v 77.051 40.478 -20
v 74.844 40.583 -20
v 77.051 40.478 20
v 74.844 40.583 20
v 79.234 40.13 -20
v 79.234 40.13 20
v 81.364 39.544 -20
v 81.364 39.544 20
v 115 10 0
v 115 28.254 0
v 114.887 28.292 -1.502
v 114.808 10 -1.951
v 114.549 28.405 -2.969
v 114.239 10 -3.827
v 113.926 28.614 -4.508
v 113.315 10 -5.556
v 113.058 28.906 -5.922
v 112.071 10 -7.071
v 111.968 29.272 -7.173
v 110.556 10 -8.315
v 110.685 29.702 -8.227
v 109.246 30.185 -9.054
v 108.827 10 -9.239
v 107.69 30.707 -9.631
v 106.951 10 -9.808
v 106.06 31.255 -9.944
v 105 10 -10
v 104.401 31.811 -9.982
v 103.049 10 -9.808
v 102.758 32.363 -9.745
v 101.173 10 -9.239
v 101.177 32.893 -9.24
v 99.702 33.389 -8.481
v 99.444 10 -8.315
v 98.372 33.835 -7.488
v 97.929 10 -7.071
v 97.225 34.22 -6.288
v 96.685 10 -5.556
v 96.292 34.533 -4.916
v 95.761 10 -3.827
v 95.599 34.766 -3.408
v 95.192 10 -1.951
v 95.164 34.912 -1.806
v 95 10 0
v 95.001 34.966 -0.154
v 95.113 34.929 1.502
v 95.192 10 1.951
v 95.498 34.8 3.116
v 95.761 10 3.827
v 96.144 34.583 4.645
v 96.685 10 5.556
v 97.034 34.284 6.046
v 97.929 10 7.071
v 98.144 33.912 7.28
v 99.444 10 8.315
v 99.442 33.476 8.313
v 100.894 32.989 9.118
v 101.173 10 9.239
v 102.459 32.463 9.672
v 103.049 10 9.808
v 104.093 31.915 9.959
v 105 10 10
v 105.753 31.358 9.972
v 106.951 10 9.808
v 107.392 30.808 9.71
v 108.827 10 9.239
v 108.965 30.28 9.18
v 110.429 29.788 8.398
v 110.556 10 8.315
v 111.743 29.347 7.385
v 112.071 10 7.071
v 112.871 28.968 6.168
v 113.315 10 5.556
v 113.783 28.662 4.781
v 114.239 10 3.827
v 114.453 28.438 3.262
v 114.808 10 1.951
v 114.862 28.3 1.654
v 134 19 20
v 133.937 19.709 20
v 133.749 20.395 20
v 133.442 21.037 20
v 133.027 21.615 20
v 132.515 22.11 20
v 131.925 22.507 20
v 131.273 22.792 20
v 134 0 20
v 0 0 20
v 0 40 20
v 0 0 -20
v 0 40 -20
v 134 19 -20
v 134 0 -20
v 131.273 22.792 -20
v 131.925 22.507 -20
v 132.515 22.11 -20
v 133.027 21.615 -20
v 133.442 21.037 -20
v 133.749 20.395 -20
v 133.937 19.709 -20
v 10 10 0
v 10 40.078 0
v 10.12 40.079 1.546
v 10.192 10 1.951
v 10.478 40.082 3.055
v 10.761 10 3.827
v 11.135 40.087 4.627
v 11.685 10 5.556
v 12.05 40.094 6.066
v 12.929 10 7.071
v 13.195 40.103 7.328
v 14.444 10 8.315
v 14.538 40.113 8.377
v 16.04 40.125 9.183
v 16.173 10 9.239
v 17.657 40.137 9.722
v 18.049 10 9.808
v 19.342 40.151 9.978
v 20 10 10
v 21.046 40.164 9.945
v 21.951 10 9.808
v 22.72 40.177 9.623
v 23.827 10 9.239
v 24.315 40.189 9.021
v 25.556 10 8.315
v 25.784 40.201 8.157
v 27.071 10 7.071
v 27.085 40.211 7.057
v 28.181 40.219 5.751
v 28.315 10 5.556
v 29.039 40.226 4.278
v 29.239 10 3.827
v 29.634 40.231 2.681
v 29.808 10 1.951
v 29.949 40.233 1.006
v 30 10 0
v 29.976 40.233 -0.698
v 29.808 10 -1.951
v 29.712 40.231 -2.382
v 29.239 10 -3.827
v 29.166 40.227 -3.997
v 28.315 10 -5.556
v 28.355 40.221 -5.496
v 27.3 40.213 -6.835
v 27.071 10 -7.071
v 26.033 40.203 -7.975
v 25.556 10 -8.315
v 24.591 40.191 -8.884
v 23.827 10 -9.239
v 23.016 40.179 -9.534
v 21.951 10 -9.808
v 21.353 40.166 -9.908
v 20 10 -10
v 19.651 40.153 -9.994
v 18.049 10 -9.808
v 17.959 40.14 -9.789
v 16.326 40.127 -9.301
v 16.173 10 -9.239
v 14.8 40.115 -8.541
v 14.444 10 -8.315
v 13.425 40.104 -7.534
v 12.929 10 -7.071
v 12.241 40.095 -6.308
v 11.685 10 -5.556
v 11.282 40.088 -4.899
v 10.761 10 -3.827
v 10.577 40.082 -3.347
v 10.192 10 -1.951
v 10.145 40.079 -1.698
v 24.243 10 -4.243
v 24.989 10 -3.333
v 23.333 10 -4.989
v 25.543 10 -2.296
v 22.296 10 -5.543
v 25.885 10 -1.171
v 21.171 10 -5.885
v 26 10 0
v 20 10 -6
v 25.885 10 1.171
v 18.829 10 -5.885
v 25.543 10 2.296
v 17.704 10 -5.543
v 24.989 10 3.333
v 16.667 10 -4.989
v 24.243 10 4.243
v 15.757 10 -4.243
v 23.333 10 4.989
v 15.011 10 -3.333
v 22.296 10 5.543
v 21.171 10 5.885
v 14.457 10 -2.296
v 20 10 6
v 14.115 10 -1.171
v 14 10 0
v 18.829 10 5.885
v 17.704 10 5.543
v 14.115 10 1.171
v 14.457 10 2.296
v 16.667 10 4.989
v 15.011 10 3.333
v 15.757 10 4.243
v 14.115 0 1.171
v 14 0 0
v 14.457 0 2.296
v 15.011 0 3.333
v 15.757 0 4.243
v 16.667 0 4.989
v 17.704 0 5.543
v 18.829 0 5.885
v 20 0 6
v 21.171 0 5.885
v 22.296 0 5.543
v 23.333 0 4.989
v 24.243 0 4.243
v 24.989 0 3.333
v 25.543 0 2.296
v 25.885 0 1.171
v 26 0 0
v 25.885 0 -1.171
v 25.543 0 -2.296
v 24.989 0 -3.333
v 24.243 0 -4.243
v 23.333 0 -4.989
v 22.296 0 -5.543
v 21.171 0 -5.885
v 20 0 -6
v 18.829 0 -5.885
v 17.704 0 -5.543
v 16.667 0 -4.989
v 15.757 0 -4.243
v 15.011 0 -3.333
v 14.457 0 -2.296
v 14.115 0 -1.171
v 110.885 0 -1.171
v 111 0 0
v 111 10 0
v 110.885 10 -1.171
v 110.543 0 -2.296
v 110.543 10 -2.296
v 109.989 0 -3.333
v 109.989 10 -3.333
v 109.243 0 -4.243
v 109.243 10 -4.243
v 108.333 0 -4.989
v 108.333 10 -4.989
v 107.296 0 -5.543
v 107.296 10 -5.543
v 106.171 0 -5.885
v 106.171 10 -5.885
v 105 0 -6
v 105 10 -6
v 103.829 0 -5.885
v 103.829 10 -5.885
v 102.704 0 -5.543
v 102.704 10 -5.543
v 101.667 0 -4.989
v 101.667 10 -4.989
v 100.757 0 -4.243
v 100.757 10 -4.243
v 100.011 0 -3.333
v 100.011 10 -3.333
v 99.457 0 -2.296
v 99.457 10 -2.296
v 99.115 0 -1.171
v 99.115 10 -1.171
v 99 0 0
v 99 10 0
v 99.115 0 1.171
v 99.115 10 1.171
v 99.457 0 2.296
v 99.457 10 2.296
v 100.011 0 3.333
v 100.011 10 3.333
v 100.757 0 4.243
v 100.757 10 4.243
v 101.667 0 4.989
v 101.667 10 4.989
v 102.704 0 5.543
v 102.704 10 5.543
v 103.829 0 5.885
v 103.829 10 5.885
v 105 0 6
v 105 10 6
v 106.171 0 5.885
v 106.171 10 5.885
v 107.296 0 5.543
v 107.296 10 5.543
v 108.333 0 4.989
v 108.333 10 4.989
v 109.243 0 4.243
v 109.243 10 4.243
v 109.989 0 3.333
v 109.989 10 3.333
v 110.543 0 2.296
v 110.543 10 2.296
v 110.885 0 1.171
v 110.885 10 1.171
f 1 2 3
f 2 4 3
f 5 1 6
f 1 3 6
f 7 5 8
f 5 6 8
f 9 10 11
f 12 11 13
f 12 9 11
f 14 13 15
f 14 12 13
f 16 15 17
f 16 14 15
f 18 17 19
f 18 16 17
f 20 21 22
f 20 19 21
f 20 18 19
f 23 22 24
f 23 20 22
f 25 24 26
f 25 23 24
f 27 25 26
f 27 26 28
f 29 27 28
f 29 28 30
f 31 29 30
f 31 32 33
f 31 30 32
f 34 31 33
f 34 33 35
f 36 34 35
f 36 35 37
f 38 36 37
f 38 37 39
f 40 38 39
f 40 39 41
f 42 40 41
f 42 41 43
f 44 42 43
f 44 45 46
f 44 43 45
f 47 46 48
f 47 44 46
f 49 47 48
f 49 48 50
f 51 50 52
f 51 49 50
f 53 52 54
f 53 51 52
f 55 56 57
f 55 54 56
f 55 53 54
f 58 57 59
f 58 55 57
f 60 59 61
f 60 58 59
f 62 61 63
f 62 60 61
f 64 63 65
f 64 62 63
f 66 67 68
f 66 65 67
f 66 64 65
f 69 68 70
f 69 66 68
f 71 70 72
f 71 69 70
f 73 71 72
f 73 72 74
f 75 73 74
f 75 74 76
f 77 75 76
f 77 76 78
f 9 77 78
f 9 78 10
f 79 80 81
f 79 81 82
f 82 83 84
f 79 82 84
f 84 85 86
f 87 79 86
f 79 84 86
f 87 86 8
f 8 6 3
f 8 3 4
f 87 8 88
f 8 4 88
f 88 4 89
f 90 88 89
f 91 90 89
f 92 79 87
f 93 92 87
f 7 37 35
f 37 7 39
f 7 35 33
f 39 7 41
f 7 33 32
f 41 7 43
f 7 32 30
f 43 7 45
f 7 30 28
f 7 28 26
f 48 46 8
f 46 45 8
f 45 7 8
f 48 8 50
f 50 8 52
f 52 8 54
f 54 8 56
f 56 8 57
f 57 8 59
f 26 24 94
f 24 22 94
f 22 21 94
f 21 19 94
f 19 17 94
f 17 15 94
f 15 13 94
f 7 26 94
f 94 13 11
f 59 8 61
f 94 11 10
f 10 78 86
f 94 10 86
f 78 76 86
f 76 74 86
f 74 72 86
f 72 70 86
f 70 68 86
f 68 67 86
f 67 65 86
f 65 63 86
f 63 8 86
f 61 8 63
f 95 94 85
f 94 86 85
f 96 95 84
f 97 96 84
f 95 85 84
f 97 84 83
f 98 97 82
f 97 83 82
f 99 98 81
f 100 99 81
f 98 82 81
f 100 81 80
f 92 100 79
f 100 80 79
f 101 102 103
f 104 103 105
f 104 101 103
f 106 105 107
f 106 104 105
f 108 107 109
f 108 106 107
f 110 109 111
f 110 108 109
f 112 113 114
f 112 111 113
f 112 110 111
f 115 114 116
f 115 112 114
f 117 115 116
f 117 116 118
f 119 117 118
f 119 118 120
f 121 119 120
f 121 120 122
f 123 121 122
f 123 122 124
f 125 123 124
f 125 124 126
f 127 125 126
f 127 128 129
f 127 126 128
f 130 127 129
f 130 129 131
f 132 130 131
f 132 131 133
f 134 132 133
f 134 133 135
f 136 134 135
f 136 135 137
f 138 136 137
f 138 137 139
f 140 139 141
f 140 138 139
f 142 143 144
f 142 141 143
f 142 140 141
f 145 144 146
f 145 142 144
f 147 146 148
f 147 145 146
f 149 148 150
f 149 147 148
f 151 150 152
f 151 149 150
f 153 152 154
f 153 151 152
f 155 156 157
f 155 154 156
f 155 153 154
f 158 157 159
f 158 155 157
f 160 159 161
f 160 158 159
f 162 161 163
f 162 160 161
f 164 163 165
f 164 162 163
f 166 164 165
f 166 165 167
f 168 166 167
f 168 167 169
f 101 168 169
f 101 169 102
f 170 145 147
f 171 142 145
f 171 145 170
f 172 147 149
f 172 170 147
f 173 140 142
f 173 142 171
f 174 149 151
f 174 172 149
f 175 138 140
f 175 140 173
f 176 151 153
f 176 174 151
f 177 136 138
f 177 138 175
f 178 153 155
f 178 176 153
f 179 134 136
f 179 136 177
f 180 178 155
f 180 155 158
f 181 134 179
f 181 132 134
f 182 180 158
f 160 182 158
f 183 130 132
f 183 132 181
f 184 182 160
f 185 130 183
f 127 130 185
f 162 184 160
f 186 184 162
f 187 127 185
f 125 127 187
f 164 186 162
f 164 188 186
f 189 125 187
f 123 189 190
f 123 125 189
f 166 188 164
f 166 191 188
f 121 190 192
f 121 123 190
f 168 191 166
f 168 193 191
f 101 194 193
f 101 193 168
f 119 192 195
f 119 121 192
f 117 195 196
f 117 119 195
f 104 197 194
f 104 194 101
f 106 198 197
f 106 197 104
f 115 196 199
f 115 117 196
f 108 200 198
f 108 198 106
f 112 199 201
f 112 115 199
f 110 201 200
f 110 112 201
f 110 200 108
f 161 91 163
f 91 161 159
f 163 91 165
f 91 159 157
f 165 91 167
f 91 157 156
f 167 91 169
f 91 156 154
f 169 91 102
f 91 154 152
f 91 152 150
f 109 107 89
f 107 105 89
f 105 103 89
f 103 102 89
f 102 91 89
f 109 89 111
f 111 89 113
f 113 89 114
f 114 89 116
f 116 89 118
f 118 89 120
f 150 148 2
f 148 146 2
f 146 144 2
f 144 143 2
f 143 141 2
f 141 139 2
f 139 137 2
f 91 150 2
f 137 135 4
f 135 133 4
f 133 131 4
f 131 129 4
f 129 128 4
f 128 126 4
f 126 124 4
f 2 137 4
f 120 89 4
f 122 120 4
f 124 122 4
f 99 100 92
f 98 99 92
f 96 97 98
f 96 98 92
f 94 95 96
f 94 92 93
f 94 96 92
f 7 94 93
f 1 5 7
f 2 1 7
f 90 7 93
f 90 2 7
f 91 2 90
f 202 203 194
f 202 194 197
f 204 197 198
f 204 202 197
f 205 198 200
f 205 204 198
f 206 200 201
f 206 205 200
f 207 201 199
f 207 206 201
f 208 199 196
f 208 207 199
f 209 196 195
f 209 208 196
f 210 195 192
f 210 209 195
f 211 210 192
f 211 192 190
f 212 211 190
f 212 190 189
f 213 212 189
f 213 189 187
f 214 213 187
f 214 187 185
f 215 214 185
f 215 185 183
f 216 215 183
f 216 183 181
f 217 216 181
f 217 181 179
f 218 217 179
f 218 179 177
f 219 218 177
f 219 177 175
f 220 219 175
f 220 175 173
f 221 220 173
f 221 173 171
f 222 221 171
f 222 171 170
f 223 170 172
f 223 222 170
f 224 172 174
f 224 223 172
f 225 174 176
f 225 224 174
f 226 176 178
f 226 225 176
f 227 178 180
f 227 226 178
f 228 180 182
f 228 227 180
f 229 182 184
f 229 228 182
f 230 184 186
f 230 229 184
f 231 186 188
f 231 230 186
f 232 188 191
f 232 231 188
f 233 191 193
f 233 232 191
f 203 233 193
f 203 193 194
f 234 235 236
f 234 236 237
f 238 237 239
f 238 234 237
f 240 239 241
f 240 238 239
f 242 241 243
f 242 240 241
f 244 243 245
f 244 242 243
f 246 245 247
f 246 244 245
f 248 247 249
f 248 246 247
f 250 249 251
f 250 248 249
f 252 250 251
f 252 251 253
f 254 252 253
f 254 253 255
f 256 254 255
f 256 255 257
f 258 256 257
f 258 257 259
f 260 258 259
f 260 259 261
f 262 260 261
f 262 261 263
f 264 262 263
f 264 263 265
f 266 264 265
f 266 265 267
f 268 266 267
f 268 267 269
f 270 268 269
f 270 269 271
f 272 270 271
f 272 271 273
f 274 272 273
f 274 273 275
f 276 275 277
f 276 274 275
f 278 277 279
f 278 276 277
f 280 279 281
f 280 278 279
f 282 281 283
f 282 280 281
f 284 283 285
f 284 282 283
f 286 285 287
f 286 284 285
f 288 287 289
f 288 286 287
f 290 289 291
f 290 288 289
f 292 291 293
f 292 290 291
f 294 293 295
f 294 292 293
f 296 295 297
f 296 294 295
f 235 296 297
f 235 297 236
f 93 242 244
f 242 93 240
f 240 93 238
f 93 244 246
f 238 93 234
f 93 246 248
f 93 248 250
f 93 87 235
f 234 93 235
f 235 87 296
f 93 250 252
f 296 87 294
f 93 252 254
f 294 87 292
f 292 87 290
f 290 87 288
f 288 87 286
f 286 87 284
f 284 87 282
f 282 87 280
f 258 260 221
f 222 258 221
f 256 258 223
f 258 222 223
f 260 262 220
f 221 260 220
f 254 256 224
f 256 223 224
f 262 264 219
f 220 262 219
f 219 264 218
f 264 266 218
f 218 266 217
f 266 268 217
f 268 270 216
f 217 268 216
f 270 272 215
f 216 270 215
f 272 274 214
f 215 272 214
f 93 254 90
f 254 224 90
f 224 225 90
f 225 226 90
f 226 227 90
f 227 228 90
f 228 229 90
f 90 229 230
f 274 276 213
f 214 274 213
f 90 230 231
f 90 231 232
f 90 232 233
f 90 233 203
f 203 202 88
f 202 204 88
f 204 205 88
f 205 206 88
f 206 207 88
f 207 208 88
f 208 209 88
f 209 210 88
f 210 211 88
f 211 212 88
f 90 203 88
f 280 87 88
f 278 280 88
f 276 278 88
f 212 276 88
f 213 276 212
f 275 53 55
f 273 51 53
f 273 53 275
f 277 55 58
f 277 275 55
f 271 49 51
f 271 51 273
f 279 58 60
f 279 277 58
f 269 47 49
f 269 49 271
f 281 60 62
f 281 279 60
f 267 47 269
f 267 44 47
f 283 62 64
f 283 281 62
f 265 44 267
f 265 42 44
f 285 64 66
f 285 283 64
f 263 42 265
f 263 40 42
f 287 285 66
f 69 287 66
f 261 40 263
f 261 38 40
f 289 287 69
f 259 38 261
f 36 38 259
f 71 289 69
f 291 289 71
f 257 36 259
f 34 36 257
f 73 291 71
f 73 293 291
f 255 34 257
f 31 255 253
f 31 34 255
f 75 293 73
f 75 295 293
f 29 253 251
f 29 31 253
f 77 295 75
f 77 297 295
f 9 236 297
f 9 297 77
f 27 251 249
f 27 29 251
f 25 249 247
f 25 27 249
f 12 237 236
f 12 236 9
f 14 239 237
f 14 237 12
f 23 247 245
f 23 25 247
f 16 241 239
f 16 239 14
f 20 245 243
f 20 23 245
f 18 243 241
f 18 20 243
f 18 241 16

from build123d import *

# Parameters (mm, degrees)
BOSS_EXTRUDE1_DEPTH = 20
SKETCH4_R           = 6
CUT_EXTRUDE11_DEPTH = 142.431949953
CUT_EXTRUDE12_START = 10
SKETCH4_13_R        = 10
SKETCH4_13_R_2      = 6
CUT_EXTRUDE12_DEPTH = 132.431949953


with BuildPart() as part:
    # Sketch1 → Boss-Extrude1 (new, symmetric)
    with BuildSketch(Plane.XY):
        with BuildLine():
            Line((0, 0), (0, 40))
            Line((0, 40), (74.844322004, 40.582598355))
            ThreePointArc((74.844322004, 40.582598355), (78.147309148, 40.334012976), (81.36396939, 39.543686675))
            Line((81.36396939, 39.543686675), (131.272793878, 22.792096484))
            ThreePointArc((131.272793878, 22.792096484), (133.247397074, 21.335468314), (134, 19))
            Line((134, 19), (134, 0))
            Line((134, 0), (0, 0))
        make_face()
    extrude(amount=BOSS_EXTRUDE1_DEPTH, both=True)

    # Sketch4 → Cut-Extrude11 (cut, through all)
    with BuildSketch(Plane(origin=(0, 0, 0), x_dir=(1, 0, 0), z_dir=(0, 1, 0))):
        with Locations((20, 0)):
            Circle(SKETCH4_R)
        with Locations((105, 0)):
            Circle(SKETCH4_R)
    extrude(amount=CUT_EXTRUDE11_DEPTH, mode=Mode.SUBTRACT)

    # Sketch4<13> → Cut-Extrude12 (cut, through all)
    # profile 1 of 2: a face of its own
    with BuildSketch(Plane(origin=(0, 0, 0), x_dir=(1, 0, 0), z_dir=(0, 1, 0)).offset(CUT_EXTRUDE12_START)):
        with Locations((20, 0)):
            Circle(SKETCH4_13_R)
        with Locations((20, 0)):
            Circle(SKETCH4_13_R_2, mode=Mode.SUBTRACT)
    # profile 2 of 2: a face of its own
    with BuildSketch(Plane(origin=(0, 0, 0), x_dir=(1, 0, 0), z_dir=(0, 1, 0)).offset(CUT_EXTRUDE12_START)):
        with Locations((105, 0)):
            Circle(SKETCH4_13_R)
        with Locations((105, 0)):
            Circle(SKETCH4_13_R_2, mode=Mode.SUBTRACT)
    extrude(amount=CUT_EXTRUDE12_DEPTH, mode=Mode.SUBTRACT)


solid = part.part
